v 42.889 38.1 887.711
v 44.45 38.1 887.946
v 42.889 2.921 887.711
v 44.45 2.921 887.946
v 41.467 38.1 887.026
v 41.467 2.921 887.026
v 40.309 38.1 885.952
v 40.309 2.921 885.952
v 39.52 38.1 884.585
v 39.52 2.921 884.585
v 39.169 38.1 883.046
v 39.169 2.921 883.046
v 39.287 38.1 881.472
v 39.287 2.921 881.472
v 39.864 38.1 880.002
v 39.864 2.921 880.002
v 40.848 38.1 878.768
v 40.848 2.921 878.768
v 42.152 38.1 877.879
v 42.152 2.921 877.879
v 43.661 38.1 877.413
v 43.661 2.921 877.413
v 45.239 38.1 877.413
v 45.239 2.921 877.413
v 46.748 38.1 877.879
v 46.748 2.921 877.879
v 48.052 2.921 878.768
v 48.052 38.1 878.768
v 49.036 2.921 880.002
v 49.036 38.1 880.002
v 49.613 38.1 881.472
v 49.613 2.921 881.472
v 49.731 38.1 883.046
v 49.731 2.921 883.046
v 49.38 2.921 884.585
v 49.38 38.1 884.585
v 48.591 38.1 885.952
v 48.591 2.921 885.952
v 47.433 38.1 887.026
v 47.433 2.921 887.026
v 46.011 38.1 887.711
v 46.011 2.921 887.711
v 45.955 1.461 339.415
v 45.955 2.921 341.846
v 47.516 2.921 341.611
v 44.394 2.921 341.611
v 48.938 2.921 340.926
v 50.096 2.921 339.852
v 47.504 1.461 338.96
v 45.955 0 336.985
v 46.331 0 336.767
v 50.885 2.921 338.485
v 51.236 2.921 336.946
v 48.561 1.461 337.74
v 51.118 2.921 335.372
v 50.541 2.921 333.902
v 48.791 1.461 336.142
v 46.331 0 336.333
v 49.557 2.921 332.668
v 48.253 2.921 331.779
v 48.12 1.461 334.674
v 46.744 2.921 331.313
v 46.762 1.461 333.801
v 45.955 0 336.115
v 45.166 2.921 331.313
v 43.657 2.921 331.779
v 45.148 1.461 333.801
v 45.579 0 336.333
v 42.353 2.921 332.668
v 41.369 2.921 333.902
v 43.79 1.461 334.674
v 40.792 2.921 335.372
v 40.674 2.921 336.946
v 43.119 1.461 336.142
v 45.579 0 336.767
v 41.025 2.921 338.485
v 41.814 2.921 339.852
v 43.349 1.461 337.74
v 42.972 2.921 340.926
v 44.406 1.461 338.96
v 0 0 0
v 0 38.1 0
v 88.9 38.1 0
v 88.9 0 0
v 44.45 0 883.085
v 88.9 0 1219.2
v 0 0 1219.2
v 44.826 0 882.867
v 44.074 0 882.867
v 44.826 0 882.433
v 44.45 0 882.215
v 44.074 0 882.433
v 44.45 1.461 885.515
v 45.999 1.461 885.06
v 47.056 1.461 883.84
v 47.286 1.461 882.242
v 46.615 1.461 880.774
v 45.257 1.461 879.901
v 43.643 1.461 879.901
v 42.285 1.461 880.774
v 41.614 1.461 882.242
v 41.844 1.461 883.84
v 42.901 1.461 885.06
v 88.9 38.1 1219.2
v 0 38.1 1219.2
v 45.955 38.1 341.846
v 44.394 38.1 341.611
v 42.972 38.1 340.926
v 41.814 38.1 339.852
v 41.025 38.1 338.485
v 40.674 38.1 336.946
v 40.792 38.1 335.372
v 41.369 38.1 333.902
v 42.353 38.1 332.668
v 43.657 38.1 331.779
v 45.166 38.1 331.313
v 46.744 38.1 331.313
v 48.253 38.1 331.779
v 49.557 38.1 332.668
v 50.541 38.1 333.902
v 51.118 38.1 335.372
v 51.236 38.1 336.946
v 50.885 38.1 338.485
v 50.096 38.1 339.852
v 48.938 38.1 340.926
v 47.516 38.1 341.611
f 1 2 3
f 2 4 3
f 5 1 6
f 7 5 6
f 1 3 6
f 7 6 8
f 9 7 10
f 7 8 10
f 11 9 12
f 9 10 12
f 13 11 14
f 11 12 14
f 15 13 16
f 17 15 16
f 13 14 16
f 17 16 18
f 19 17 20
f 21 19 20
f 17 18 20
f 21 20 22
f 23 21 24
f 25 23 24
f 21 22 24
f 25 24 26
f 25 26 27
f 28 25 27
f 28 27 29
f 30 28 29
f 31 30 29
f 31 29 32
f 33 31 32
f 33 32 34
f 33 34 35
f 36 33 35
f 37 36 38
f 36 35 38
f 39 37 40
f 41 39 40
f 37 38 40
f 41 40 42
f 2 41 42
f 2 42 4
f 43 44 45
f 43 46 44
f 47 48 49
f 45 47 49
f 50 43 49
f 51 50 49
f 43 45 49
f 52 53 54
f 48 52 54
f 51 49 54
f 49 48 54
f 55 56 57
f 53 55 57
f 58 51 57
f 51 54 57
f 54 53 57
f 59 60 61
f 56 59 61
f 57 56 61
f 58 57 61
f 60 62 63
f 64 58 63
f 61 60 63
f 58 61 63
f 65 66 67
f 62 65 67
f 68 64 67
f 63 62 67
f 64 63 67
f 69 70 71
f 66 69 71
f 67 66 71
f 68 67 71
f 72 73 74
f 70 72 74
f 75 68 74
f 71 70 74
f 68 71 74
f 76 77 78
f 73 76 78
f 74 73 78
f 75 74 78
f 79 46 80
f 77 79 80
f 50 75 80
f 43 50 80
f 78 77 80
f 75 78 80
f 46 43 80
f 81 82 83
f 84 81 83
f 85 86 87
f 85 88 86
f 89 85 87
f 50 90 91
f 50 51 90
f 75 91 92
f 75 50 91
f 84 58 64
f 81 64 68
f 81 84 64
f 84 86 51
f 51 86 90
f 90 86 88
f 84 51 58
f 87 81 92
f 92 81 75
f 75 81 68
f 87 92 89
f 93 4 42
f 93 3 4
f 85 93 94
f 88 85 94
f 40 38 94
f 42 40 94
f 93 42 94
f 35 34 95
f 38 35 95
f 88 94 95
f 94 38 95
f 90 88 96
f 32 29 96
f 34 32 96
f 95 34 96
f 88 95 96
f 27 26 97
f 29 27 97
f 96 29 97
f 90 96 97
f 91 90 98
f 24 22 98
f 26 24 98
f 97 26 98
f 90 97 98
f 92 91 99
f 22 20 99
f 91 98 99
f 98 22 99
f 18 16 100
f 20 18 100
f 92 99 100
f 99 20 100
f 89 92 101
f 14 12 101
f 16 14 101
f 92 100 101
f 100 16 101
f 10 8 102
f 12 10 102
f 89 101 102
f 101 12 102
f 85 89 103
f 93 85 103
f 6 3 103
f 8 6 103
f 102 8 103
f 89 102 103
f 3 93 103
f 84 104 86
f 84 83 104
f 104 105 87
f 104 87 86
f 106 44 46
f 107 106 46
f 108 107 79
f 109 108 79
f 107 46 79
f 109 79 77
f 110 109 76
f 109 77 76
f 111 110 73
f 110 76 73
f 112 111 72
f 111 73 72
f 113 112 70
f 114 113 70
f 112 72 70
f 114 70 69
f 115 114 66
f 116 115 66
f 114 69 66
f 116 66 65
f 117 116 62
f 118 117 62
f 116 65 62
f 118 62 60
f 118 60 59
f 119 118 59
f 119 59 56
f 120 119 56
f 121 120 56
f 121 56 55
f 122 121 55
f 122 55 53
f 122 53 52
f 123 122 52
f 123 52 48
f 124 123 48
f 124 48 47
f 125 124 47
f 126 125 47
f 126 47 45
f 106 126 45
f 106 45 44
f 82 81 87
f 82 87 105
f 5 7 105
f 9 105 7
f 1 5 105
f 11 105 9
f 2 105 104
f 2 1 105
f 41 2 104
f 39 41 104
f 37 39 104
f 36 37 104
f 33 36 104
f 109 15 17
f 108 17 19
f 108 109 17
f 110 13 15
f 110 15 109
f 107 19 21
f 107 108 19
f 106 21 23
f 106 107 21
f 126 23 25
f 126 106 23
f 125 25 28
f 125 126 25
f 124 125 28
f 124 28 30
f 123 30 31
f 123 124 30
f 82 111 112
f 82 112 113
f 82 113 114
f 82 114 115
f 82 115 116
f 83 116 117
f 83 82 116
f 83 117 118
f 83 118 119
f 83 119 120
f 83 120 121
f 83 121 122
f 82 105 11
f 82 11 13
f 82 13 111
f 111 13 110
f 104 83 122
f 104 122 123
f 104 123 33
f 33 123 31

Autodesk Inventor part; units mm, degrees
ref_plane "YZ Plane" through (0, 0, 0) normal (1, 0, 0) x (0, 1, 0)
ref_plane "XZ Plane" through (0, 0, 0) normal (0, 1, 0) x (-1, 0, 0)
ref_plane "XY Plane" through (0, 0, 0) normal (0, 0, 1) x (1, 0, 0)
sketch "Sketch1" plane through (0, 0, 0) normal (0, 0, 1) x (1, 0, 0)
  line L0 (0, 0) -> (0, 38.1)
  line L1 (0, 38.1) -> (88.9, 38.1)
  line L2 (88.9, 38.1) -> (88.9, 0)
  line L3 (88.9, 0) -> (0, 0)
  dimension "d0" = 38.1
  dimension "d1" = 88.9
extrude "Extrusion1" add sketch "Sketch1" along normal blind 533.4
sketch "Sketch3" plane through (0, 0, 533.4) normal (0, 0, 1) x (1, 0, 0)
  line L0 (0, 38.1) -> (0, 0) projected
  line L1 (0, 0) -> (88.9, 0) projected
  line L2 (88.9, 0) -> (88.9, 38.1) projected
  line L3 (88.9, 38.1) -> (0, 38.1) projected
extrude "Extrusion2" add sketch "Sketch3" along normal blind 685.8
sketch "Sketch5" plane through (0, 38.1, 0) normal (0, 1, 0) x (1, 0, 0)
  line L0 (0, 0) -> (88.9, 0) projected
  line L1 (0, 0) -> (0, -1219.2) projected
  line L2 (88.9, -1219.2) -> (0, -1219.2) projected
  line L3 (88.9, 0) -> (88.9, -1219.2) projected
  line L4 (88.9, 0) -> (0, 0) projected
  line L5 (88.9, 0) -> (0, 0)
  line L6 (0, -38.1) -> (88.9, -38.1)
  line L7 (0, -295.275) -> (88.9, -295.275)
  line L8 (0, -333.375) -> (88.9, -333.375)
  line L9 (0, -590.55) -> (88.9, -590.55)
  line L10 (0, -628.65) -> (88.9, -628.65)
  line L11 (0, -885.825) -> (88.9, -885.825)
  line L12 (0, -923.925) -> (88.9, -923.925)
  line L13 (0, -1181.1) -> (88.9, -1181.1)
  line L14 (0, -1219.2) -> (88.9, -1219.2)
  dimension "d15" = 38.1
  dimension "d16" = 257.175
  dimension "d17" = 38.1
  dimension "d18" = 257.175
  dimension "d19" = 38.1
  dimension "d20" = 257.175
  dimension "d21" = 38.1
  dimension "d22" = 257.175
  dimension "d23" = 38.1
sketch "Sketch6" plane through (0, 38.1, 0) normal (0, 1, 0) x (1, 0, 0)
  line L0 (88.9, 0) -> (88.9, -336.55)
  line L1 (88.9, -1219.2) -> (88.9, -882.65)
  line L2 (88.9, -1219.2) -> (425.45, -1219.2) construction
  point P0 (44.45, -882.65)
  point P1 (45.955, -336.55)
  dimension "d26" = 90
hole "Hole1" at (44.45, 38.1, 882.65) at (45.955, 38.1, 336.55) direction (0, -1, 0) diameter 10.5918 depth 35.179 tip angle 118 thread size "1/2-13 UNC" class "2B" standard "ANSI Unified Screw Threads"
properties part number "48in 2x4" material "Pine, Radiata"
